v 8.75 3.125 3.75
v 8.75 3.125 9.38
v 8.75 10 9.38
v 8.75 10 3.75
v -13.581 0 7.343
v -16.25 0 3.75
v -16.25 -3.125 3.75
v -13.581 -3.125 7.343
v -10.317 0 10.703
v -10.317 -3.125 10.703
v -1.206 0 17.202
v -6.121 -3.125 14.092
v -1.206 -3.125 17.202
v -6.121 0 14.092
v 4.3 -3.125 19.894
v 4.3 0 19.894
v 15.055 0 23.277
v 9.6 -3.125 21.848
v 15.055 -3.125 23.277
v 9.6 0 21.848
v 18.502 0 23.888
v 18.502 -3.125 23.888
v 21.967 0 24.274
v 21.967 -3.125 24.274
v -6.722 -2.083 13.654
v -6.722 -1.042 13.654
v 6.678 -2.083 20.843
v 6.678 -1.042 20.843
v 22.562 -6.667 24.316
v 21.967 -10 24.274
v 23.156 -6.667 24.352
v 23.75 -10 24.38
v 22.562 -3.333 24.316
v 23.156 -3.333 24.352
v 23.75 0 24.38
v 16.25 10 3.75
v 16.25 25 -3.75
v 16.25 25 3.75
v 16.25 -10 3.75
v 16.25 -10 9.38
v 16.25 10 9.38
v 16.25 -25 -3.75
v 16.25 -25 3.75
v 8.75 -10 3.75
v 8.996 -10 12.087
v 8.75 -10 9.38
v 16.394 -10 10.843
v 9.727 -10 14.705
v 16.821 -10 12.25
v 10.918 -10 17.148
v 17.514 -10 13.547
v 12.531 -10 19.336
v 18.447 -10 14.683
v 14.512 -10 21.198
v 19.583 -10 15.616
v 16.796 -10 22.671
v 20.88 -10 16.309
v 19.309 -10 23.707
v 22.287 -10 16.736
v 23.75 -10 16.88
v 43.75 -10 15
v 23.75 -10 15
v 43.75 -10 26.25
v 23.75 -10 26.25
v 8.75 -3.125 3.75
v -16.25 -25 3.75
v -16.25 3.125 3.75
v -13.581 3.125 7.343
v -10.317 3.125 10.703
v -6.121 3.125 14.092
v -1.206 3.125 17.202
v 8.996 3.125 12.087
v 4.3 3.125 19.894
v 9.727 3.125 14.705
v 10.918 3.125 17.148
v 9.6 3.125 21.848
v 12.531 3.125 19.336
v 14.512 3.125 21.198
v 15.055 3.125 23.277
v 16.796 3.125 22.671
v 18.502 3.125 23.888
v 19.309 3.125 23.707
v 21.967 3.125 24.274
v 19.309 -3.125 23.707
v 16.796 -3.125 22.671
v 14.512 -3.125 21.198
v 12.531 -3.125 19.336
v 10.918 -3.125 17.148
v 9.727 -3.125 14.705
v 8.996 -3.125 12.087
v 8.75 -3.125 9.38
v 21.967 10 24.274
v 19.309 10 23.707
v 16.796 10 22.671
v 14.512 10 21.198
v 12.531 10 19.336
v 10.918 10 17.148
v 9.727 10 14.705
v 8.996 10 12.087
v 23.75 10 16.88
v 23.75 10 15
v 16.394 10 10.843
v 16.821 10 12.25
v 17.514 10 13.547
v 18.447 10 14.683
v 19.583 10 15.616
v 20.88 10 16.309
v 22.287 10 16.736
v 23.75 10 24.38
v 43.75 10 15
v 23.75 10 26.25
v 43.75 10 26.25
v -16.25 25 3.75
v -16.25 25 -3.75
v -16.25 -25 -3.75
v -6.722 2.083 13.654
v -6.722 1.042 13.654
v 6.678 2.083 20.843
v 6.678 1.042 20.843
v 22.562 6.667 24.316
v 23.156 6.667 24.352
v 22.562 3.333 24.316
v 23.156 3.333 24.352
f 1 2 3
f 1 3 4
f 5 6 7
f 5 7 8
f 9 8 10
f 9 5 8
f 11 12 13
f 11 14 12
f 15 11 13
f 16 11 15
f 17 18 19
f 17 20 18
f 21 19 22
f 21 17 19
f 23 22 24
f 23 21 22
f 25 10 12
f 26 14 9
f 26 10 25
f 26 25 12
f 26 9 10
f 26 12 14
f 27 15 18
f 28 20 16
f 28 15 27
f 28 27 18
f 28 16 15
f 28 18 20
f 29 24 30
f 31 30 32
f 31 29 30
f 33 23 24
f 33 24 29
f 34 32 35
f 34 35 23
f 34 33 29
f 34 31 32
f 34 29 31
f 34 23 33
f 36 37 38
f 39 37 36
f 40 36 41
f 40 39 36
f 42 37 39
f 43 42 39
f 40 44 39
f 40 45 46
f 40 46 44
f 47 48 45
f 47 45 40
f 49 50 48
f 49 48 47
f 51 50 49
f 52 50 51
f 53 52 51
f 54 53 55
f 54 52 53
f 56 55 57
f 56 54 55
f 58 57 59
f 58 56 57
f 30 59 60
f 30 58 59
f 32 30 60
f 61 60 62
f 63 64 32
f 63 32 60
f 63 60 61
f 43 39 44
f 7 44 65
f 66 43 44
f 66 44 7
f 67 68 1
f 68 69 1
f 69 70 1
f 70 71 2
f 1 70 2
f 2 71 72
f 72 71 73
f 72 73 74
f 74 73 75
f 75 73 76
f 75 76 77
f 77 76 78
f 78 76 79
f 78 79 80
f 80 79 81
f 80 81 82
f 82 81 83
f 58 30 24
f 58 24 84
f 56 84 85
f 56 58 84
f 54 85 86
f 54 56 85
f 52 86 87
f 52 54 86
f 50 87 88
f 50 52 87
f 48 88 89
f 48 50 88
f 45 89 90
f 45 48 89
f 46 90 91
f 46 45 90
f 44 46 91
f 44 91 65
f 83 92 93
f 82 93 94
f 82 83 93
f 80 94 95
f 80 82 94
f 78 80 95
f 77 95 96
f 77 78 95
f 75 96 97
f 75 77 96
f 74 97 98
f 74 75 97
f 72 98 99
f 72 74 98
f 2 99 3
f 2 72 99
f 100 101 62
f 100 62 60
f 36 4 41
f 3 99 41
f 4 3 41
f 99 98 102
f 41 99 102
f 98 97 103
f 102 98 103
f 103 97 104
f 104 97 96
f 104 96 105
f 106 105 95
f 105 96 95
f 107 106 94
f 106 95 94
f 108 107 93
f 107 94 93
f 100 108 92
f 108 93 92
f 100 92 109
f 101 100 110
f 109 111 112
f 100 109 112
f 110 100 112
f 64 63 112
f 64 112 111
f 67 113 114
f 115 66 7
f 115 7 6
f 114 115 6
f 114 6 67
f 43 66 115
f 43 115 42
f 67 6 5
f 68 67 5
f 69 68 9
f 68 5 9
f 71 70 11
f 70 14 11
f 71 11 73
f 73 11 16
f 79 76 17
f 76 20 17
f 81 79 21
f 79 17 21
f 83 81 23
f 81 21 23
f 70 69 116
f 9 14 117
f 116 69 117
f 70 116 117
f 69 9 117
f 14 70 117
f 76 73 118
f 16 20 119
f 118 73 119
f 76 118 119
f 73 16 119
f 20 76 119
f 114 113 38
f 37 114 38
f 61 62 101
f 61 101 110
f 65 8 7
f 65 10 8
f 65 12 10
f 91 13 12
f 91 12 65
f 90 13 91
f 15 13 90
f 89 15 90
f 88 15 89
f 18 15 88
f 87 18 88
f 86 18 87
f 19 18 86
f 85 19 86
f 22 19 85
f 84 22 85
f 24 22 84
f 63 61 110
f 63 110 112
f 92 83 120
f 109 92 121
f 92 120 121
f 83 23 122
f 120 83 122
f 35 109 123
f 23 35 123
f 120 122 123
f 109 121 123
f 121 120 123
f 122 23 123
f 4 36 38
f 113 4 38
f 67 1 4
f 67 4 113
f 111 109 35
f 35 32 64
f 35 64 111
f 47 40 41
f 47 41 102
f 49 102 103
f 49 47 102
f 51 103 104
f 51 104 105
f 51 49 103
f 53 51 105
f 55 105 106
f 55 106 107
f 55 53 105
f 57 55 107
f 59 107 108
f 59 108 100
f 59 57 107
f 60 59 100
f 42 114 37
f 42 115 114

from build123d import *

# Parameters (mm, degrees)
F1_DEPTH = 25
F0_W     = 10
F0_H     = 7.5
F0_H_2   = 1.88
F0_H_3   = 1.87
F2_DEPTH = 10
F3_DEPTH = 3.125


with BuildPart() as f1:
    # F0 (on Front) → F1 (new body, symmetric)
    with BuildSketch(Plane.XZ):
        Polygon((16.25, -3.75), (16.25, 3.75), (8.75, 3.75), (-16.25, 3.75), (-16.25, -3.75), align=None)
    extrude(amount=F1_DEPTH, both=True)

    # F0 (on Front) → F2 (join, symmetric)
    with BuildSketch(Plane.XZ):
        with BuildLine():
            Line((8.75, 3.75), (16.25, 3.75))
            Line((16.25, 3.75), (16.25, 9.38))
            ThreePointArc((16.25, 9.38), (18.4466991411, 14.6833008589), (23.75, 16.88))
            Line((23.75, 16.88), (23.75, 24.38))
            add(Edge.make_bspline(
                [(21.9670846153, 24.2736635094), (22.5617558007, 24.3196900172), (23.156226413, 24.3552224615), (23.75, 24.38)],
                knots=[43.3513201218, 43.3513201218, 43.3513201218, 43.3513201218, 45.0066317336, 45.0066317336, 45.0066317336, 45.0066317336], degree=3))
            ThreePointArc((21.9670846153, 24.2736635094), (12.5307368609, 19.3363112956), (8.75, 9.38))
            Line((8.75, 9.38), (8.75, 3.75))
        make_face()
        with Locations((28.75, 20.63)):
            Rectangle(F0_W, F0_H)
        with Locations((28.75, 15.94)):
            Rectangle(F0_W, F0_H_2)
        with Locations((28.75, 25.315)):
            Rectangle(F0_W, F0_H_3)
        Polygon((33.75, 24.38), (33.75, 16.88), (33.75, 15), (43.75, 15), (43.75, 26.25), (33.75, 26.25), align=None)
    extrude(amount=F2_DEPTH, both=True)

    # F0 (on Front) → F3 (join, symmetric)
    with BuildSketch(Plane.XZ):
        with BuildLine():
            Line((-16.25, 3.75), (8.75, 3.75))
            Line((8.75, 3.75), (8.75, 9.38))
            ThreePointArc((8.75, 9.38), (12.5307368609, 19.3363112956), (21.9670846153, 24.2736635094))
            add(Edge.make_bspline(
                [(-16.25, 3.75), (-9.3184325712, 14.665248361), (6.3931100598, 23.0682651661), (21.9670846153, 24.2736635094)],
                knots=[0, 0, 0, 0, 43.3513201218, 43.3513201218, 43.3513201218, 43.3513201218], degree=3))
        make_face()
    extrude(amount=F3_DEPTH, both=True)


solid = f1.part
